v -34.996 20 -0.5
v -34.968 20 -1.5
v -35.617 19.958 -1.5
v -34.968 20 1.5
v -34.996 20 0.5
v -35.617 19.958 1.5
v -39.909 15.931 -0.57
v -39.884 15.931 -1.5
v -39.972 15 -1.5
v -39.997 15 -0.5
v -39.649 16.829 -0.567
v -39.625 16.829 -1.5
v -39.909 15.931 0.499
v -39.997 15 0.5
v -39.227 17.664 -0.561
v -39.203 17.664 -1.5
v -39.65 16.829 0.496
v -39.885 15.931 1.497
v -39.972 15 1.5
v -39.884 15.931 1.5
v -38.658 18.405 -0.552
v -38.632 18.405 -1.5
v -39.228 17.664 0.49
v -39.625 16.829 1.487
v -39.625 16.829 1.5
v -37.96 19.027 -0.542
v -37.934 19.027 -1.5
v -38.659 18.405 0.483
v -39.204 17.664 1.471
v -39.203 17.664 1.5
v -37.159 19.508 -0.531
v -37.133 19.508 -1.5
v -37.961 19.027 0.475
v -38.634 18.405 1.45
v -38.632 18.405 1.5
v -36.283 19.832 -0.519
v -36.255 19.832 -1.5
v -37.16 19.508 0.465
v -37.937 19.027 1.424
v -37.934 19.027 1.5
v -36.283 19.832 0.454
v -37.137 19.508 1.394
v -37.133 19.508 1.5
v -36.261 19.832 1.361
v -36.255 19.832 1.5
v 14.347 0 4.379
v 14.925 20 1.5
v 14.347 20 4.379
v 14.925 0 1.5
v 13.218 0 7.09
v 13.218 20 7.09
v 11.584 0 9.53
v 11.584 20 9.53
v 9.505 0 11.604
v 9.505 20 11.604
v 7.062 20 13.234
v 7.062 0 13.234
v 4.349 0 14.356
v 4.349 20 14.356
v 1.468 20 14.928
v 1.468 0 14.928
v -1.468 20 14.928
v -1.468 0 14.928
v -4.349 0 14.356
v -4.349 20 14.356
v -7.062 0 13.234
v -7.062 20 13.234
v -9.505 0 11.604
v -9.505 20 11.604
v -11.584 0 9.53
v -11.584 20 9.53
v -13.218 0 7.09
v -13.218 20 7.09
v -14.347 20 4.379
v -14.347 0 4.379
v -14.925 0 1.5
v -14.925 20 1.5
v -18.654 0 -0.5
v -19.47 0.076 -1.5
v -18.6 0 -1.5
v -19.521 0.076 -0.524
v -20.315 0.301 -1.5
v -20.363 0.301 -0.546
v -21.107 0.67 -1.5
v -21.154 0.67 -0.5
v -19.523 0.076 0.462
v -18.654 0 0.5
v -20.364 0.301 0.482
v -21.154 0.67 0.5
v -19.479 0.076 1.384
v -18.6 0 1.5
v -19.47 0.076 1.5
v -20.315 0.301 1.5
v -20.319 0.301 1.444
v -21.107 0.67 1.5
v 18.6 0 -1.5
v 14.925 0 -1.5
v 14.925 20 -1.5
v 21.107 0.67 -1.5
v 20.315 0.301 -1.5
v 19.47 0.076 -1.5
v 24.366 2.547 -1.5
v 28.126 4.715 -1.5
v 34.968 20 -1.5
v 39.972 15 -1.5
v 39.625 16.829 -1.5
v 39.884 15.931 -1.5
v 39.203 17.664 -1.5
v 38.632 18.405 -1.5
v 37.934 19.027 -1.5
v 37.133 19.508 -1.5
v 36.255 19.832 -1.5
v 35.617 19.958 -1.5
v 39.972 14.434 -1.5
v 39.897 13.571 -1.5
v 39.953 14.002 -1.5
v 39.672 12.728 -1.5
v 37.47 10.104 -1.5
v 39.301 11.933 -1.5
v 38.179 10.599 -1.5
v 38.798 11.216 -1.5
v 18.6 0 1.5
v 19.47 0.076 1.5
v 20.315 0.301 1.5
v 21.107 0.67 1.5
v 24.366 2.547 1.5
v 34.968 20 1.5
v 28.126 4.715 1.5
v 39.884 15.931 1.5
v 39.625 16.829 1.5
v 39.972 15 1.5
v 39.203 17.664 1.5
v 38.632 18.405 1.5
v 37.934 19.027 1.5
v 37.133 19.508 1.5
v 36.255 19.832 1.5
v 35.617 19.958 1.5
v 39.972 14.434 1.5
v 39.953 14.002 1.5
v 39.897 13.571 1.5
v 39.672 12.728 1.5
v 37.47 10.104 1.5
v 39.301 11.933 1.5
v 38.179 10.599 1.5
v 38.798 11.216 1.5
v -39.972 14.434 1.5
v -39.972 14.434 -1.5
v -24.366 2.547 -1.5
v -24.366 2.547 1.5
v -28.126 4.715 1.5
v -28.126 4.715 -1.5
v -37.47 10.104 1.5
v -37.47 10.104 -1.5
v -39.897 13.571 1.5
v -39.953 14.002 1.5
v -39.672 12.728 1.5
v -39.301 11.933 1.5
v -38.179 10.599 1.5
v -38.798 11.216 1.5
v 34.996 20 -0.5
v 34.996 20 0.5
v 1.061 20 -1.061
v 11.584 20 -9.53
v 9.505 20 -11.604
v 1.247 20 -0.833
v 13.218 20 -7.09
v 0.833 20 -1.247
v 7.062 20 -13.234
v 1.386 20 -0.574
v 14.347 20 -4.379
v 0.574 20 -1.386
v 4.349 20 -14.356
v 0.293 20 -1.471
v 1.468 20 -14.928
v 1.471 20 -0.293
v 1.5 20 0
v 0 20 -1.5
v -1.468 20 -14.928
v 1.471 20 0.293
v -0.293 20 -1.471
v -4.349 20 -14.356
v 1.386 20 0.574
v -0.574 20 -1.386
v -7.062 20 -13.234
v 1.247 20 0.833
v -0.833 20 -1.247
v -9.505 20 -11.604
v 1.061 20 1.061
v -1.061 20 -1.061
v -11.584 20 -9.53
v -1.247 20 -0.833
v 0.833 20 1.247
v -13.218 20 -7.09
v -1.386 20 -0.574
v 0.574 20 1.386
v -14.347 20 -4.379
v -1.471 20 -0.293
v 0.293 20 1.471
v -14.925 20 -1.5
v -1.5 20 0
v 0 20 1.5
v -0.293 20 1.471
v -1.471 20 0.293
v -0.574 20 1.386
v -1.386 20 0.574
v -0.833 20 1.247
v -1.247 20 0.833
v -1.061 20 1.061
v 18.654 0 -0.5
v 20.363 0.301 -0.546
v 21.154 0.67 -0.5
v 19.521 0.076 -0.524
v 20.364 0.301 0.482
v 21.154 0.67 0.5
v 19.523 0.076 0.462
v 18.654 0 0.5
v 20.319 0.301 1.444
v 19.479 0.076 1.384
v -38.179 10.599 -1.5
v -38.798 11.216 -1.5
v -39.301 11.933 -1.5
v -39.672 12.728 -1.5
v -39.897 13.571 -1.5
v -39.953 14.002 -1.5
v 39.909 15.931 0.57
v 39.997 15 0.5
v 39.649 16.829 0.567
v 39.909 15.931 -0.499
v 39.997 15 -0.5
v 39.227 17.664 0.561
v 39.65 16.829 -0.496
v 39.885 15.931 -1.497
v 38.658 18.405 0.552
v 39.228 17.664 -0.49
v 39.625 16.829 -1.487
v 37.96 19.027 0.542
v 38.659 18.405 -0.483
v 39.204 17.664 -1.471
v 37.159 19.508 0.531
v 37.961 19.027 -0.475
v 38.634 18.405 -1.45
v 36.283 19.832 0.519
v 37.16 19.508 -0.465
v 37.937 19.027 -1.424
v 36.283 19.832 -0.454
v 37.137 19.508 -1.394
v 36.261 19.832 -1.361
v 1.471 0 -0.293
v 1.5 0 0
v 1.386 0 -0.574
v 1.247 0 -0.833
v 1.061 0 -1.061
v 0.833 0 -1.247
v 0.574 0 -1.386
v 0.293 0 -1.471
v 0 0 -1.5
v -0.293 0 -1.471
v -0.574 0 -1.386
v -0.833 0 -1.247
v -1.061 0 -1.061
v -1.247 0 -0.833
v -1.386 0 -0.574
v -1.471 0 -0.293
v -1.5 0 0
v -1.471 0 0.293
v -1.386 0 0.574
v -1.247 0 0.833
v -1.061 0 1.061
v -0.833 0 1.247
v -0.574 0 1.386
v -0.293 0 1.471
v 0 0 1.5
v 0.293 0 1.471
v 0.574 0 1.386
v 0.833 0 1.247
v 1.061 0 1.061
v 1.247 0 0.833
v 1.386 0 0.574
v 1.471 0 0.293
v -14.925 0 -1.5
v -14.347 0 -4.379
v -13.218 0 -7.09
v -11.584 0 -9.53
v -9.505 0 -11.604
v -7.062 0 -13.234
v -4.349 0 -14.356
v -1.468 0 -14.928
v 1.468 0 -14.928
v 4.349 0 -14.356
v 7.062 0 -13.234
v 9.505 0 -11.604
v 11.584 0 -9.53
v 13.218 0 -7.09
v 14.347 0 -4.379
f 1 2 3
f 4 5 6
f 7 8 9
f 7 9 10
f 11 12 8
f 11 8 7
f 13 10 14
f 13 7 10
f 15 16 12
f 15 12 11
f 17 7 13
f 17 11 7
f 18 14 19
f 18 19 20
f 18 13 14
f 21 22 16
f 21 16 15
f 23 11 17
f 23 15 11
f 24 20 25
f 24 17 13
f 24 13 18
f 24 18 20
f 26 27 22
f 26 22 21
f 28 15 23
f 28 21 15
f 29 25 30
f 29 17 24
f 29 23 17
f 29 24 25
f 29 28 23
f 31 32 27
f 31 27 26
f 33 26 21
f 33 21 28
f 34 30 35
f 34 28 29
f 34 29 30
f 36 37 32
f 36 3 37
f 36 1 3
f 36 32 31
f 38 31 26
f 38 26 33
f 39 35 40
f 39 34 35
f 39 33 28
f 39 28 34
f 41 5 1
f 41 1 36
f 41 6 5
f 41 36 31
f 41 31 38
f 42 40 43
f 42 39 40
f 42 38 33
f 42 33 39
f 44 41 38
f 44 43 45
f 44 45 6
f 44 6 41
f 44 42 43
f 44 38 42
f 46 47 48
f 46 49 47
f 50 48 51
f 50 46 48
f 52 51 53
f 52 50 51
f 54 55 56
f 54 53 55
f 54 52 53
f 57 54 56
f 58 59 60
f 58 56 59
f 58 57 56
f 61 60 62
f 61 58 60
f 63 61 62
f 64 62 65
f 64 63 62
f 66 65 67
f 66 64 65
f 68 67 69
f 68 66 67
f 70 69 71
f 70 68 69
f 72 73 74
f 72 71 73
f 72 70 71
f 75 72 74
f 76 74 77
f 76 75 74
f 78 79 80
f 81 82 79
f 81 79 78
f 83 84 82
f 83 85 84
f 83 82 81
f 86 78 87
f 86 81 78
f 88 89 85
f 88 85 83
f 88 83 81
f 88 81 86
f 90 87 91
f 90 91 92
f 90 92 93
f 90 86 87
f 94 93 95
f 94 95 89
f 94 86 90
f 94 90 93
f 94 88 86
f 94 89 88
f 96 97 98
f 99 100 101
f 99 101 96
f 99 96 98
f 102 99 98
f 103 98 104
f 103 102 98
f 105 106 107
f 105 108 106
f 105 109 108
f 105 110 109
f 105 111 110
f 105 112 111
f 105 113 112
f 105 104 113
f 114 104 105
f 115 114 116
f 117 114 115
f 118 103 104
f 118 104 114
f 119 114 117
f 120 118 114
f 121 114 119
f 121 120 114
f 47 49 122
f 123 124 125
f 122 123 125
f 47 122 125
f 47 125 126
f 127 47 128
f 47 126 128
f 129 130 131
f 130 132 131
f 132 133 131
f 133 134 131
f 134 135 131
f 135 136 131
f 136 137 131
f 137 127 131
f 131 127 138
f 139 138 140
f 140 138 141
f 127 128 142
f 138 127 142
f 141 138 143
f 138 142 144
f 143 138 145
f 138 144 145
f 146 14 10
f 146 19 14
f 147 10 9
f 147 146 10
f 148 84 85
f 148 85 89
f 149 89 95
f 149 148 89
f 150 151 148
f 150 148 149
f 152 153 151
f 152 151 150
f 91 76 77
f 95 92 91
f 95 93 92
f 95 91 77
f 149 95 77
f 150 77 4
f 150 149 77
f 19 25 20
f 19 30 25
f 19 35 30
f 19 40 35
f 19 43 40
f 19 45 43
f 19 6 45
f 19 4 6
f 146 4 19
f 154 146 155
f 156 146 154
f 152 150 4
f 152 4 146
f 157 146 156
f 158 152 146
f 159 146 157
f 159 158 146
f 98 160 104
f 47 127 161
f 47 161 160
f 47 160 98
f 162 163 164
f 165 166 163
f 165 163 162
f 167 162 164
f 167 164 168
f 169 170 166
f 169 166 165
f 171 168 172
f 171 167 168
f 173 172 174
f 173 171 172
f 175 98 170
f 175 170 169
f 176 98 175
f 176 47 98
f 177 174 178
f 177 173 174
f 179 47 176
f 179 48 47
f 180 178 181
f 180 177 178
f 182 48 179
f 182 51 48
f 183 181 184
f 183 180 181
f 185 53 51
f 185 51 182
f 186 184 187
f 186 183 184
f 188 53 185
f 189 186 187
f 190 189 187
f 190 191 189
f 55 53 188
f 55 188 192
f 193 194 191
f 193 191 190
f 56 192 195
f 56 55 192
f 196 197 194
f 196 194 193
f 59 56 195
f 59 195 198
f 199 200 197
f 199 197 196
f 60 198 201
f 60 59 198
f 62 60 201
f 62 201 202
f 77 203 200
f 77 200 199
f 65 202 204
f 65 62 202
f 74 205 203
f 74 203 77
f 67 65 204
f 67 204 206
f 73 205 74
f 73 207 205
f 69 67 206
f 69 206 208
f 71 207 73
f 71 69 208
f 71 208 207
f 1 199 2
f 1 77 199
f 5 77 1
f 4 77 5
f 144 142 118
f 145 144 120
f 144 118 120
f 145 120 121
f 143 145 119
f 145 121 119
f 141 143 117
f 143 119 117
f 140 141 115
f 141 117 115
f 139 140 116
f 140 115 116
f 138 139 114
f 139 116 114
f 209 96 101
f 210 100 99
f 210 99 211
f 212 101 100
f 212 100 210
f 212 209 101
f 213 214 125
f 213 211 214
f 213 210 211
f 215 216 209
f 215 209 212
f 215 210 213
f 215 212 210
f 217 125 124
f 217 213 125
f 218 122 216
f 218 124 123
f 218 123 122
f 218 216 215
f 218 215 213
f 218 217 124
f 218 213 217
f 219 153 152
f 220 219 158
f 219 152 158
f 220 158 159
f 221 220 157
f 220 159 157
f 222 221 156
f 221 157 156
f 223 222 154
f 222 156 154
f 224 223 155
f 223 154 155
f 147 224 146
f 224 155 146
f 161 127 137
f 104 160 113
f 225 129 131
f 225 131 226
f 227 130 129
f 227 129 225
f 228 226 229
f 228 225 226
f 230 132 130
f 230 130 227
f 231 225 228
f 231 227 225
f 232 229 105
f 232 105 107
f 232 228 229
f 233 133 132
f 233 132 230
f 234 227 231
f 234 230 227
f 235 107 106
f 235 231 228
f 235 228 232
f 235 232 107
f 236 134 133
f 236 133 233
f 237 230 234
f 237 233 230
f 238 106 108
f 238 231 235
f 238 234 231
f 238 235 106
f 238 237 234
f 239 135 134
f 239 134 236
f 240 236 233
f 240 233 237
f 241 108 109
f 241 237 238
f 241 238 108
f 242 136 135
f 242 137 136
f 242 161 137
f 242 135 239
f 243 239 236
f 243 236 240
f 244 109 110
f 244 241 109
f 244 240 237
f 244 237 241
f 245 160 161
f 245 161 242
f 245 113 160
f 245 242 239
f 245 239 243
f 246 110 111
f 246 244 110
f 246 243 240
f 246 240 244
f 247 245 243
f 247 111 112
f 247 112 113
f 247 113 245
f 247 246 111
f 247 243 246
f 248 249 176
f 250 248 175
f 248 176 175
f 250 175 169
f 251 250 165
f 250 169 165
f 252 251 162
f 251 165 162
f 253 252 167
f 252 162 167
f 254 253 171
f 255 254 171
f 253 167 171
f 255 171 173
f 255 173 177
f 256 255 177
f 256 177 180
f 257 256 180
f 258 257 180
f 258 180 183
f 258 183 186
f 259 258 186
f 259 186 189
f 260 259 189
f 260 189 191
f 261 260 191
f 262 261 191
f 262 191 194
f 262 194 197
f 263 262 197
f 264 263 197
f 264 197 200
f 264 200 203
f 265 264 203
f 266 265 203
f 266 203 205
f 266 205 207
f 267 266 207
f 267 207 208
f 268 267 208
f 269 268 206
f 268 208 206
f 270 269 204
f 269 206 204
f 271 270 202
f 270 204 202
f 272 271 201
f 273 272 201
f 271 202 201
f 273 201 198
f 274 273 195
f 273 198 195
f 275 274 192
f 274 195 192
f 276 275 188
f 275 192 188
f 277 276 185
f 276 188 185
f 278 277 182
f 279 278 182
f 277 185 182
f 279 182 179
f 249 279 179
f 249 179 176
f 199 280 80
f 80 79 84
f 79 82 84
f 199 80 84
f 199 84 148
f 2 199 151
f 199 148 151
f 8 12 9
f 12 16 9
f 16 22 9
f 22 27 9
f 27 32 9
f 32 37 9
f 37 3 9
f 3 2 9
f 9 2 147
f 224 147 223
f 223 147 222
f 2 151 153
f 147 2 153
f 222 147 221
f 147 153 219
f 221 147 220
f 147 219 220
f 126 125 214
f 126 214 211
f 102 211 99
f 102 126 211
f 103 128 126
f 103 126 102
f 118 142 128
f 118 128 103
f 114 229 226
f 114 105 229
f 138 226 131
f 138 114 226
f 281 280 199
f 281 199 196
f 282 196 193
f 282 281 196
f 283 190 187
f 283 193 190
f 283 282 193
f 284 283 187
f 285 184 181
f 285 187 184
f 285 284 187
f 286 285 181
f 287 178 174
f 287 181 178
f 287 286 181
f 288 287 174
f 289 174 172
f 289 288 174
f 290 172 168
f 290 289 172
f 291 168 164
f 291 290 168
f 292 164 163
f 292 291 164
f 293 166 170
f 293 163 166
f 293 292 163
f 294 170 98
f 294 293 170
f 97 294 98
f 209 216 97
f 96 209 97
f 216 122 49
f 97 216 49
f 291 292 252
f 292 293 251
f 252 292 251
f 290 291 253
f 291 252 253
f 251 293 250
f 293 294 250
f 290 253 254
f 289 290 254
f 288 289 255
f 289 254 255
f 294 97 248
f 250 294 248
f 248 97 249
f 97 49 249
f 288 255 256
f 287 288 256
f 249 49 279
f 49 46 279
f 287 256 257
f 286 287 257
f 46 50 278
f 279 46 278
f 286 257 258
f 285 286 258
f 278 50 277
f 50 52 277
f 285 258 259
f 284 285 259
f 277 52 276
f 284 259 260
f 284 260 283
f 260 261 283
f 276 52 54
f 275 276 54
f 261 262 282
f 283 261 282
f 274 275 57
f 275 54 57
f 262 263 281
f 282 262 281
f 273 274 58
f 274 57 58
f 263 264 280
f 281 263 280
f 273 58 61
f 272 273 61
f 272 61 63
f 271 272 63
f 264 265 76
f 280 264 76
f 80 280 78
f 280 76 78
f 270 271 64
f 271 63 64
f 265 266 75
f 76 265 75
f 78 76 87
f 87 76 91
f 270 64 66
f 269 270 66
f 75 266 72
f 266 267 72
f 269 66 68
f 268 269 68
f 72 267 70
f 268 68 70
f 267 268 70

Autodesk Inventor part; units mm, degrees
ref_plane "YZ Plane" through (0, 0, 0) normal (1, 0, 0) x (0, 1, 0)
ref_plane "XZ Plane" through (0, 0, 0) normal (0, 1, 0) x (-1, 0, 0)
ref_plane "XY Plane" through (0, 0, 0) normal (0, 0, 1) x (1, 0, 0)
sketch "Sketch1" plane through (0, 0, 0) normal (0, 1, 0) x (-1, 0, 0)
  line L0 (15, 0) -> (40, 0) construction
  line L1 (-15, 0) -> (-40, 0) construction
  line L2 (14.9248, -1.5) -> (39.9719, -1.5)
  line L3 (14.9248, 1.5) -> (39.9719, 1.5)
  line L4 (-14.9248, -1.5) -> (-39.9719, -1.5)
  line L5 (-14.9248, 1.5) -> (-39.9719, 1.5)
  arc A0 (-39.9719, 1.5) -> (-39.9719, -1.5) centre (0, 0) ccw
  arc A1 (39.9719, -1.5) -> (39.9719, 1.5) centre (0, 0) ccw
  arc A2 (14.9248, 1.5) -> (-14.9248, 1.5) centre (0, 0) ccw
  arc A3 (-14.9248, -1.5) -> (14.9248, -1.5) centre (0, 0) ccw
  dimension "d2" = 1.5
  dimension "d3" = 1.5
  dimension "d4" = 1.5
  dimension "d5" = 1.5
extrude "Extrusion1" add sketch "Sketch1" along normal blind 20
fillet "Fillet1" radius 5 2 edges at (40, 20, 0) (-40, 20, 0)
chamfer "Chamfer1" distance 20 angle 30 1 edges at (-40, 0, 0) measured on face at (-3.3541, 0, 5.1142)
chamfer "Chamfer2" distance 20 angle 30 1 edges at (40, 0, 0) measured on face at (2.3541, 0, 4.4112)
fillet "Fillet2" radius 5 2 edges at (40, 11.547, 0) (-40, 11.547, 0)
fillet "Fillet3" radius 5 2 edges at (20, 0, 0) (-20, 0, 0)
sketch "Sketch3" plane through (0, 20, 0) normal (0, 1, 0) x (1, 0, 0)
  arc A0 (-34.9678, 1.5) -> (-34.9678, -1.5) centre (0, 0) ccw construction
  line L0 (-34.9678, -1.5) -> (-14.9248, -1.5) construction
  arc A1 (-14.9248, -1.5) -> (14.9248, -1.5) centre (0, 0) ccw construction
  line L1 (14.9248, -1.5) -> (34.9678, -1.5) construction
  arc A2 (34.9678, -1.5) -> (34.9678, 1.5) centre (0, 0) ccw construction
  line L2 (34.9678, 1.5) -> (14.9248, 1.5) construction
  arc A3 (14.9248, 1.5) -> (-14.9248, 1.5) centre (0, 0) ccw construction
  line L3 (-14.9248, 1.5) -> (-34.9678, 1.5) construction
  circle A4 centre (0, 0) radius 1.5
  dimension "d36" = 3
extrude "Extrusion2" cut sketch "Sketch3" against normal through all
equation "\"d2\" = 0.5 * blade_width"
equation "\"d3\" = 0.5 * blade_width"
equation "\"d4\" = 0.5 * blade_width"
equation "\"d5\" = 0.5 * blade_width"
equation "\"blade_width\" = 3"
equation "\"d21\" = 0"
equation "\"d22\" = 5"
equation "\"d23\" = 3"
equation "\"d24\" = 5"
equation "\"d25\" = 0"
equation "\"d8\" = 0.5 * blade_width"
equation "\"d9\" = 0.5 * blade_width"
equation "\"d10\" = 0.5 * blade_width"
equation "\"d11\" = 0.5 * blade_width"
equation "\"d12\" = 0.5 * blade_width"
equation "\"d13\" = 0.5 * blade_width"
equation "\"d14\" = 0.5 * blade_width"
equation "\"d15\" = 0.5 * blade_width"
equation "\"d16\" = 0.5 * blade_width"
equation "\"d17\" = 0.5 * blade_width"
equation "\"d18\" = 0.5 * blade_width"
equation "\"d19\" = 0.5 * blade_width"
properties part number "top_propeller"
